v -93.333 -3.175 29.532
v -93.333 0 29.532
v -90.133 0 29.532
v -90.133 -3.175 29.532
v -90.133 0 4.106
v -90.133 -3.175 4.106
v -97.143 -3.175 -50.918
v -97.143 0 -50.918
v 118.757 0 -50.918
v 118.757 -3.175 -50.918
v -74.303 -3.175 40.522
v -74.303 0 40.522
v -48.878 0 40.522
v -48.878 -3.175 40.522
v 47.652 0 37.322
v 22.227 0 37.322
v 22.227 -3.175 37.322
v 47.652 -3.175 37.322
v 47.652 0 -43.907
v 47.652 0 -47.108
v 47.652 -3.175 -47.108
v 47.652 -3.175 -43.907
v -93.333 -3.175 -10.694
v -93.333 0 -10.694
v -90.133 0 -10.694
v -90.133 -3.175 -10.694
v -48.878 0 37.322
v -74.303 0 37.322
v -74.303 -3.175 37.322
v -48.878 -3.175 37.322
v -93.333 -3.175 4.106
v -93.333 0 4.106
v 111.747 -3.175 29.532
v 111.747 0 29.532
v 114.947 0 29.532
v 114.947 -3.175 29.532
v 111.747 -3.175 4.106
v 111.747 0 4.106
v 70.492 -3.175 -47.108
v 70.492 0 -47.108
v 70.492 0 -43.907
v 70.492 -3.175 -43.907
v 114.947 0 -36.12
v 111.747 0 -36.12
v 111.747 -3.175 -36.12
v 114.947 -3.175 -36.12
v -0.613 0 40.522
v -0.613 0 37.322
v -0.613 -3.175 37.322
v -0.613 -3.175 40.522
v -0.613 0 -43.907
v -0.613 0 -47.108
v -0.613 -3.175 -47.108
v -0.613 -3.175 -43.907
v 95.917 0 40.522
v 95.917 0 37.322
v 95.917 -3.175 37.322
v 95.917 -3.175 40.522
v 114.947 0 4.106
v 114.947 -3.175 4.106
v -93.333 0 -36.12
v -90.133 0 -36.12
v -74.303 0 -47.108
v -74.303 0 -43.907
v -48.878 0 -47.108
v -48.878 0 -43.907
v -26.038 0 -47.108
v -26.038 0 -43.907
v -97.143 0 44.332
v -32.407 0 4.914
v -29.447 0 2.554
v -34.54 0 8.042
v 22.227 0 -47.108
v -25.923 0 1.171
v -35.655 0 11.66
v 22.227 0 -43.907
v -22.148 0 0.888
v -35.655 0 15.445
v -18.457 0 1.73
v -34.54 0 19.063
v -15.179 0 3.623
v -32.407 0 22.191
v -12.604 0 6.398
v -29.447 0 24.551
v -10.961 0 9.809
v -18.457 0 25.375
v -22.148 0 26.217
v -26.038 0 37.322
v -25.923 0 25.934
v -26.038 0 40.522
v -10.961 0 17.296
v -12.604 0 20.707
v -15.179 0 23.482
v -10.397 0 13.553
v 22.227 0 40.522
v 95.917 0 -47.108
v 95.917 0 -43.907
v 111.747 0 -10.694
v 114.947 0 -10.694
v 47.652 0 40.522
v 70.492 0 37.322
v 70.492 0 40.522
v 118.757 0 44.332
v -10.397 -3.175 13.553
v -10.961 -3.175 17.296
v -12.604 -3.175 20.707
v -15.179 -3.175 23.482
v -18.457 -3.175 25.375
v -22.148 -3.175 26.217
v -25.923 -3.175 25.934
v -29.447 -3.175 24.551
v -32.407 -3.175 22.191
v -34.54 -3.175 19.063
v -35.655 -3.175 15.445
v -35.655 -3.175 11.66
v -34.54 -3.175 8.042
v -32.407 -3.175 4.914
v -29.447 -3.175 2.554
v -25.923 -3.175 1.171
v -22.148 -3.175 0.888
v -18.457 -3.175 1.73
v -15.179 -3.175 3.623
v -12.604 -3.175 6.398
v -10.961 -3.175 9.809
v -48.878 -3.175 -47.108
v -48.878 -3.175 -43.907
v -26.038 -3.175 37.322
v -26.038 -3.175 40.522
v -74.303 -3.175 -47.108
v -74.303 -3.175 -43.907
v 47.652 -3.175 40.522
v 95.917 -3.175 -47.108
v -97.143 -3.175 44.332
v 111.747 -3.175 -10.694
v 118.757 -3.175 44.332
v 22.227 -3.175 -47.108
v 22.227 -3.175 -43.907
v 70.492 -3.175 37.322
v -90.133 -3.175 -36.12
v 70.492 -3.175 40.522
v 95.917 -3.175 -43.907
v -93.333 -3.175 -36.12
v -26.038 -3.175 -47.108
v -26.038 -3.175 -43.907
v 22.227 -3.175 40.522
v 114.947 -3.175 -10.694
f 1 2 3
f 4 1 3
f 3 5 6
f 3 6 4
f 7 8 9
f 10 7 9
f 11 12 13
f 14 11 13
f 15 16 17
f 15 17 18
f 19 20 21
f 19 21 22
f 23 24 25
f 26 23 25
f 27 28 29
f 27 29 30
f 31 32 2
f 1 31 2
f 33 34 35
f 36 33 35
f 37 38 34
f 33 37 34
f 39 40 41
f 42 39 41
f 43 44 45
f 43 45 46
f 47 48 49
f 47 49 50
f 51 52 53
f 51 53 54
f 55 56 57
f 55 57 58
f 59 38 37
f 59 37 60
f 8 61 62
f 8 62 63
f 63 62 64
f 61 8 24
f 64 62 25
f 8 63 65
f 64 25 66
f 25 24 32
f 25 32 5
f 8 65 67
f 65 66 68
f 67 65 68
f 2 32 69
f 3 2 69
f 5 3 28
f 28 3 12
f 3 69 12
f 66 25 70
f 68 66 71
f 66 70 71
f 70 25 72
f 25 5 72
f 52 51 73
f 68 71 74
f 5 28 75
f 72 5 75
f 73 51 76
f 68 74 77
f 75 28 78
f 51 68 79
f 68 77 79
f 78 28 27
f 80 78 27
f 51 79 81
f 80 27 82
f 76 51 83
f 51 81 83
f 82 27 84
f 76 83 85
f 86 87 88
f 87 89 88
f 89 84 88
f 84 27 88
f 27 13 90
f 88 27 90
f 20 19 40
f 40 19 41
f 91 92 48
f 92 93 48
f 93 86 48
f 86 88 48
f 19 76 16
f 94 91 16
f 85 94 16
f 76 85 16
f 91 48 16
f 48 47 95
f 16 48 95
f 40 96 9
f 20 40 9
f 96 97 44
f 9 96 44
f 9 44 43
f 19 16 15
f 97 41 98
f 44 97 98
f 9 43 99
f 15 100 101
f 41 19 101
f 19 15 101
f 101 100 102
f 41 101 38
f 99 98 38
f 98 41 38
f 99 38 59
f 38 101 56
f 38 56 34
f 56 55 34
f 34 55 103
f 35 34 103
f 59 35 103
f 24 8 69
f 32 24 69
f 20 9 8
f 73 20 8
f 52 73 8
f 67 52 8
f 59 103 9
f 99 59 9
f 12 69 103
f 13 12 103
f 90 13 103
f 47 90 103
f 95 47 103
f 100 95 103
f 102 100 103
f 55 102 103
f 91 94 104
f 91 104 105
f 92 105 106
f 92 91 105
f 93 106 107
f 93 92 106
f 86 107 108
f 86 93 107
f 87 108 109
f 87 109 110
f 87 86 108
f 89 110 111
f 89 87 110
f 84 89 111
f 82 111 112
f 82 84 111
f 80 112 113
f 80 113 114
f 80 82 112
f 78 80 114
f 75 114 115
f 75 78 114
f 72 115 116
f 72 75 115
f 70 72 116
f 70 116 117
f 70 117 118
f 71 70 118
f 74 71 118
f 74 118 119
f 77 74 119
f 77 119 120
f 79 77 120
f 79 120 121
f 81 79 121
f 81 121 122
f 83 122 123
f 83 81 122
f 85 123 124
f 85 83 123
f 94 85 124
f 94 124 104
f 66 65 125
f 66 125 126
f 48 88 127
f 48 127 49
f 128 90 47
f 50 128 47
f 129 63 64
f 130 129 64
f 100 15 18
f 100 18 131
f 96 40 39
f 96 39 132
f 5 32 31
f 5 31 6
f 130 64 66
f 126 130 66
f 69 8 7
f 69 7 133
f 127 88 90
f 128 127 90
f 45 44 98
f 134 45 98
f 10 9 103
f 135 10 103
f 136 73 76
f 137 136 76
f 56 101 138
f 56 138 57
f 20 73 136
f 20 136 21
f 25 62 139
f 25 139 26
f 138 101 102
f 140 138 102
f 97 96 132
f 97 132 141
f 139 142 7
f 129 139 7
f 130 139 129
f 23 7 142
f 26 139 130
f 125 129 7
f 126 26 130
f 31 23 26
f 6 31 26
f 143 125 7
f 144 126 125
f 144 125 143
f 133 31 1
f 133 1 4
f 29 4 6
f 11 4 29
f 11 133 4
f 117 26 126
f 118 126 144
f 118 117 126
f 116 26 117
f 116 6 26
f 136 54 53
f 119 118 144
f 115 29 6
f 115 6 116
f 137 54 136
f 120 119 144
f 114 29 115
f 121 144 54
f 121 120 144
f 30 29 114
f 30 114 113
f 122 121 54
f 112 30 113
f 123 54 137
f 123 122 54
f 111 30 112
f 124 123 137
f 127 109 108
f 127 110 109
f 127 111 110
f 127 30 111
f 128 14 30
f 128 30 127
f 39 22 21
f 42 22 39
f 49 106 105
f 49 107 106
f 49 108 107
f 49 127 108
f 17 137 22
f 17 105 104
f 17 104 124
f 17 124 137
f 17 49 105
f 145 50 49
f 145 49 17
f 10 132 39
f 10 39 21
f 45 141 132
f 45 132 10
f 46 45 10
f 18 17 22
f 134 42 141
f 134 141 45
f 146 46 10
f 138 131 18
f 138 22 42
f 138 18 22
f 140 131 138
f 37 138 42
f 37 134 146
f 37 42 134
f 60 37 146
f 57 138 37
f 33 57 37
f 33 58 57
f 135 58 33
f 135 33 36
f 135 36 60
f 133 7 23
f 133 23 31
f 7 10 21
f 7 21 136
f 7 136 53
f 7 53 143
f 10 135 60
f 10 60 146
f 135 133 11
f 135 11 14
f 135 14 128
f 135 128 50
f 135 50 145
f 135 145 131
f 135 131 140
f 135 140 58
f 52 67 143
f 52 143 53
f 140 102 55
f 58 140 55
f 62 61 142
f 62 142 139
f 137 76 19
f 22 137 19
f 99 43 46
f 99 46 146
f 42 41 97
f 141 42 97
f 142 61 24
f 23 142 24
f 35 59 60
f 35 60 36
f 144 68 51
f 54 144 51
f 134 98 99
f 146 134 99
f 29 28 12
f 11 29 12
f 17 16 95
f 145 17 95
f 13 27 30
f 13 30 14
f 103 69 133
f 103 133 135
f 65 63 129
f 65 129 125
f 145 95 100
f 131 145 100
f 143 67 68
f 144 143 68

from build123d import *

# Parameters (mm, degrees)
F0_W     = 215.9
F0_H     = 95.25
F0_W_2   = 25.4254
F0_H_2   = 3.2004
F0_W_3   = 3.2004
F0_H_3   = 25.4254
F0_R     = 12.7
F1_DEPTH = 3.175


with BuildPart() as f1:
    # F0 (on Front) → F1 (new body)
    with BuildSketch(Plane.XZ):
        with Locations((10.806967, -3.292766)):
            Rectangle(F0_W, F0_H)
        with Locations((-61.590653, -45.507566)):
            Rectangle(F0_W_2, F0_H_2, mode=Mode.SUBTRACT)
        with Locations((-13.325573, -45.507566)):
            Rectangle(F0_W_2, F0_H_2, mode=Mode.SUBTRACT)
        with Locations((-91.732833, -23.407026)):
            Rectangle(F0_W_3, F0_H_3, mode=Mode.SUBTRACT)
        with Locations((34.939507, -45.507566)):
            Rectangle(F0_W_2, F0_H_2, mode=Mode.SUBTRACT)
        with Locations((83.204587, -45.507566)):
            Rectangle(F0_W_2, F0_H_2, mode=Mode.SUBTRACT)
        with Locations((113.346767, -23.407026)):
            Rectangle(F0_W_3, F0_H_3, mode=Mode.SUBTRACT)
        with Locations((-91.732833, 16.818954)):
            Rectangle(F0_W_3, F0_H_3, mode=Mode.SUBTRACT)
        with Locations((-23.097243, 13.552523)):
            Circle(F0_R, mode=Mode.SUBTRACT)
        with Locations((-61.590653, 38.922034)):
            Rectangle(F0_W_2, F0_H_2, mode=Mode.SUBTRACT)
        with Locations((-13.325573, 38.922034)):
            Rectangle(F0_W_2, F0_H_2, mode=Mode.SUBTRACT)
        with Locations((113.346767, 16.818954)):
            Rectangle(F0_W_3, F0_H_3, mode=Mode.SUBTRACT)
        with Locations((34.939507, 38.922034)):
            Rectangle(F0_W_2, F0_H_2, mode=Mode.SUBTRACT)
        with Locations((83.204587, 38.922034)):
            Rectangle(F0_W_2, F0_H_2, mode=Mode.SUBTRACT)
    extrude(amount=F1_DEPTH)


solid = f1.part
